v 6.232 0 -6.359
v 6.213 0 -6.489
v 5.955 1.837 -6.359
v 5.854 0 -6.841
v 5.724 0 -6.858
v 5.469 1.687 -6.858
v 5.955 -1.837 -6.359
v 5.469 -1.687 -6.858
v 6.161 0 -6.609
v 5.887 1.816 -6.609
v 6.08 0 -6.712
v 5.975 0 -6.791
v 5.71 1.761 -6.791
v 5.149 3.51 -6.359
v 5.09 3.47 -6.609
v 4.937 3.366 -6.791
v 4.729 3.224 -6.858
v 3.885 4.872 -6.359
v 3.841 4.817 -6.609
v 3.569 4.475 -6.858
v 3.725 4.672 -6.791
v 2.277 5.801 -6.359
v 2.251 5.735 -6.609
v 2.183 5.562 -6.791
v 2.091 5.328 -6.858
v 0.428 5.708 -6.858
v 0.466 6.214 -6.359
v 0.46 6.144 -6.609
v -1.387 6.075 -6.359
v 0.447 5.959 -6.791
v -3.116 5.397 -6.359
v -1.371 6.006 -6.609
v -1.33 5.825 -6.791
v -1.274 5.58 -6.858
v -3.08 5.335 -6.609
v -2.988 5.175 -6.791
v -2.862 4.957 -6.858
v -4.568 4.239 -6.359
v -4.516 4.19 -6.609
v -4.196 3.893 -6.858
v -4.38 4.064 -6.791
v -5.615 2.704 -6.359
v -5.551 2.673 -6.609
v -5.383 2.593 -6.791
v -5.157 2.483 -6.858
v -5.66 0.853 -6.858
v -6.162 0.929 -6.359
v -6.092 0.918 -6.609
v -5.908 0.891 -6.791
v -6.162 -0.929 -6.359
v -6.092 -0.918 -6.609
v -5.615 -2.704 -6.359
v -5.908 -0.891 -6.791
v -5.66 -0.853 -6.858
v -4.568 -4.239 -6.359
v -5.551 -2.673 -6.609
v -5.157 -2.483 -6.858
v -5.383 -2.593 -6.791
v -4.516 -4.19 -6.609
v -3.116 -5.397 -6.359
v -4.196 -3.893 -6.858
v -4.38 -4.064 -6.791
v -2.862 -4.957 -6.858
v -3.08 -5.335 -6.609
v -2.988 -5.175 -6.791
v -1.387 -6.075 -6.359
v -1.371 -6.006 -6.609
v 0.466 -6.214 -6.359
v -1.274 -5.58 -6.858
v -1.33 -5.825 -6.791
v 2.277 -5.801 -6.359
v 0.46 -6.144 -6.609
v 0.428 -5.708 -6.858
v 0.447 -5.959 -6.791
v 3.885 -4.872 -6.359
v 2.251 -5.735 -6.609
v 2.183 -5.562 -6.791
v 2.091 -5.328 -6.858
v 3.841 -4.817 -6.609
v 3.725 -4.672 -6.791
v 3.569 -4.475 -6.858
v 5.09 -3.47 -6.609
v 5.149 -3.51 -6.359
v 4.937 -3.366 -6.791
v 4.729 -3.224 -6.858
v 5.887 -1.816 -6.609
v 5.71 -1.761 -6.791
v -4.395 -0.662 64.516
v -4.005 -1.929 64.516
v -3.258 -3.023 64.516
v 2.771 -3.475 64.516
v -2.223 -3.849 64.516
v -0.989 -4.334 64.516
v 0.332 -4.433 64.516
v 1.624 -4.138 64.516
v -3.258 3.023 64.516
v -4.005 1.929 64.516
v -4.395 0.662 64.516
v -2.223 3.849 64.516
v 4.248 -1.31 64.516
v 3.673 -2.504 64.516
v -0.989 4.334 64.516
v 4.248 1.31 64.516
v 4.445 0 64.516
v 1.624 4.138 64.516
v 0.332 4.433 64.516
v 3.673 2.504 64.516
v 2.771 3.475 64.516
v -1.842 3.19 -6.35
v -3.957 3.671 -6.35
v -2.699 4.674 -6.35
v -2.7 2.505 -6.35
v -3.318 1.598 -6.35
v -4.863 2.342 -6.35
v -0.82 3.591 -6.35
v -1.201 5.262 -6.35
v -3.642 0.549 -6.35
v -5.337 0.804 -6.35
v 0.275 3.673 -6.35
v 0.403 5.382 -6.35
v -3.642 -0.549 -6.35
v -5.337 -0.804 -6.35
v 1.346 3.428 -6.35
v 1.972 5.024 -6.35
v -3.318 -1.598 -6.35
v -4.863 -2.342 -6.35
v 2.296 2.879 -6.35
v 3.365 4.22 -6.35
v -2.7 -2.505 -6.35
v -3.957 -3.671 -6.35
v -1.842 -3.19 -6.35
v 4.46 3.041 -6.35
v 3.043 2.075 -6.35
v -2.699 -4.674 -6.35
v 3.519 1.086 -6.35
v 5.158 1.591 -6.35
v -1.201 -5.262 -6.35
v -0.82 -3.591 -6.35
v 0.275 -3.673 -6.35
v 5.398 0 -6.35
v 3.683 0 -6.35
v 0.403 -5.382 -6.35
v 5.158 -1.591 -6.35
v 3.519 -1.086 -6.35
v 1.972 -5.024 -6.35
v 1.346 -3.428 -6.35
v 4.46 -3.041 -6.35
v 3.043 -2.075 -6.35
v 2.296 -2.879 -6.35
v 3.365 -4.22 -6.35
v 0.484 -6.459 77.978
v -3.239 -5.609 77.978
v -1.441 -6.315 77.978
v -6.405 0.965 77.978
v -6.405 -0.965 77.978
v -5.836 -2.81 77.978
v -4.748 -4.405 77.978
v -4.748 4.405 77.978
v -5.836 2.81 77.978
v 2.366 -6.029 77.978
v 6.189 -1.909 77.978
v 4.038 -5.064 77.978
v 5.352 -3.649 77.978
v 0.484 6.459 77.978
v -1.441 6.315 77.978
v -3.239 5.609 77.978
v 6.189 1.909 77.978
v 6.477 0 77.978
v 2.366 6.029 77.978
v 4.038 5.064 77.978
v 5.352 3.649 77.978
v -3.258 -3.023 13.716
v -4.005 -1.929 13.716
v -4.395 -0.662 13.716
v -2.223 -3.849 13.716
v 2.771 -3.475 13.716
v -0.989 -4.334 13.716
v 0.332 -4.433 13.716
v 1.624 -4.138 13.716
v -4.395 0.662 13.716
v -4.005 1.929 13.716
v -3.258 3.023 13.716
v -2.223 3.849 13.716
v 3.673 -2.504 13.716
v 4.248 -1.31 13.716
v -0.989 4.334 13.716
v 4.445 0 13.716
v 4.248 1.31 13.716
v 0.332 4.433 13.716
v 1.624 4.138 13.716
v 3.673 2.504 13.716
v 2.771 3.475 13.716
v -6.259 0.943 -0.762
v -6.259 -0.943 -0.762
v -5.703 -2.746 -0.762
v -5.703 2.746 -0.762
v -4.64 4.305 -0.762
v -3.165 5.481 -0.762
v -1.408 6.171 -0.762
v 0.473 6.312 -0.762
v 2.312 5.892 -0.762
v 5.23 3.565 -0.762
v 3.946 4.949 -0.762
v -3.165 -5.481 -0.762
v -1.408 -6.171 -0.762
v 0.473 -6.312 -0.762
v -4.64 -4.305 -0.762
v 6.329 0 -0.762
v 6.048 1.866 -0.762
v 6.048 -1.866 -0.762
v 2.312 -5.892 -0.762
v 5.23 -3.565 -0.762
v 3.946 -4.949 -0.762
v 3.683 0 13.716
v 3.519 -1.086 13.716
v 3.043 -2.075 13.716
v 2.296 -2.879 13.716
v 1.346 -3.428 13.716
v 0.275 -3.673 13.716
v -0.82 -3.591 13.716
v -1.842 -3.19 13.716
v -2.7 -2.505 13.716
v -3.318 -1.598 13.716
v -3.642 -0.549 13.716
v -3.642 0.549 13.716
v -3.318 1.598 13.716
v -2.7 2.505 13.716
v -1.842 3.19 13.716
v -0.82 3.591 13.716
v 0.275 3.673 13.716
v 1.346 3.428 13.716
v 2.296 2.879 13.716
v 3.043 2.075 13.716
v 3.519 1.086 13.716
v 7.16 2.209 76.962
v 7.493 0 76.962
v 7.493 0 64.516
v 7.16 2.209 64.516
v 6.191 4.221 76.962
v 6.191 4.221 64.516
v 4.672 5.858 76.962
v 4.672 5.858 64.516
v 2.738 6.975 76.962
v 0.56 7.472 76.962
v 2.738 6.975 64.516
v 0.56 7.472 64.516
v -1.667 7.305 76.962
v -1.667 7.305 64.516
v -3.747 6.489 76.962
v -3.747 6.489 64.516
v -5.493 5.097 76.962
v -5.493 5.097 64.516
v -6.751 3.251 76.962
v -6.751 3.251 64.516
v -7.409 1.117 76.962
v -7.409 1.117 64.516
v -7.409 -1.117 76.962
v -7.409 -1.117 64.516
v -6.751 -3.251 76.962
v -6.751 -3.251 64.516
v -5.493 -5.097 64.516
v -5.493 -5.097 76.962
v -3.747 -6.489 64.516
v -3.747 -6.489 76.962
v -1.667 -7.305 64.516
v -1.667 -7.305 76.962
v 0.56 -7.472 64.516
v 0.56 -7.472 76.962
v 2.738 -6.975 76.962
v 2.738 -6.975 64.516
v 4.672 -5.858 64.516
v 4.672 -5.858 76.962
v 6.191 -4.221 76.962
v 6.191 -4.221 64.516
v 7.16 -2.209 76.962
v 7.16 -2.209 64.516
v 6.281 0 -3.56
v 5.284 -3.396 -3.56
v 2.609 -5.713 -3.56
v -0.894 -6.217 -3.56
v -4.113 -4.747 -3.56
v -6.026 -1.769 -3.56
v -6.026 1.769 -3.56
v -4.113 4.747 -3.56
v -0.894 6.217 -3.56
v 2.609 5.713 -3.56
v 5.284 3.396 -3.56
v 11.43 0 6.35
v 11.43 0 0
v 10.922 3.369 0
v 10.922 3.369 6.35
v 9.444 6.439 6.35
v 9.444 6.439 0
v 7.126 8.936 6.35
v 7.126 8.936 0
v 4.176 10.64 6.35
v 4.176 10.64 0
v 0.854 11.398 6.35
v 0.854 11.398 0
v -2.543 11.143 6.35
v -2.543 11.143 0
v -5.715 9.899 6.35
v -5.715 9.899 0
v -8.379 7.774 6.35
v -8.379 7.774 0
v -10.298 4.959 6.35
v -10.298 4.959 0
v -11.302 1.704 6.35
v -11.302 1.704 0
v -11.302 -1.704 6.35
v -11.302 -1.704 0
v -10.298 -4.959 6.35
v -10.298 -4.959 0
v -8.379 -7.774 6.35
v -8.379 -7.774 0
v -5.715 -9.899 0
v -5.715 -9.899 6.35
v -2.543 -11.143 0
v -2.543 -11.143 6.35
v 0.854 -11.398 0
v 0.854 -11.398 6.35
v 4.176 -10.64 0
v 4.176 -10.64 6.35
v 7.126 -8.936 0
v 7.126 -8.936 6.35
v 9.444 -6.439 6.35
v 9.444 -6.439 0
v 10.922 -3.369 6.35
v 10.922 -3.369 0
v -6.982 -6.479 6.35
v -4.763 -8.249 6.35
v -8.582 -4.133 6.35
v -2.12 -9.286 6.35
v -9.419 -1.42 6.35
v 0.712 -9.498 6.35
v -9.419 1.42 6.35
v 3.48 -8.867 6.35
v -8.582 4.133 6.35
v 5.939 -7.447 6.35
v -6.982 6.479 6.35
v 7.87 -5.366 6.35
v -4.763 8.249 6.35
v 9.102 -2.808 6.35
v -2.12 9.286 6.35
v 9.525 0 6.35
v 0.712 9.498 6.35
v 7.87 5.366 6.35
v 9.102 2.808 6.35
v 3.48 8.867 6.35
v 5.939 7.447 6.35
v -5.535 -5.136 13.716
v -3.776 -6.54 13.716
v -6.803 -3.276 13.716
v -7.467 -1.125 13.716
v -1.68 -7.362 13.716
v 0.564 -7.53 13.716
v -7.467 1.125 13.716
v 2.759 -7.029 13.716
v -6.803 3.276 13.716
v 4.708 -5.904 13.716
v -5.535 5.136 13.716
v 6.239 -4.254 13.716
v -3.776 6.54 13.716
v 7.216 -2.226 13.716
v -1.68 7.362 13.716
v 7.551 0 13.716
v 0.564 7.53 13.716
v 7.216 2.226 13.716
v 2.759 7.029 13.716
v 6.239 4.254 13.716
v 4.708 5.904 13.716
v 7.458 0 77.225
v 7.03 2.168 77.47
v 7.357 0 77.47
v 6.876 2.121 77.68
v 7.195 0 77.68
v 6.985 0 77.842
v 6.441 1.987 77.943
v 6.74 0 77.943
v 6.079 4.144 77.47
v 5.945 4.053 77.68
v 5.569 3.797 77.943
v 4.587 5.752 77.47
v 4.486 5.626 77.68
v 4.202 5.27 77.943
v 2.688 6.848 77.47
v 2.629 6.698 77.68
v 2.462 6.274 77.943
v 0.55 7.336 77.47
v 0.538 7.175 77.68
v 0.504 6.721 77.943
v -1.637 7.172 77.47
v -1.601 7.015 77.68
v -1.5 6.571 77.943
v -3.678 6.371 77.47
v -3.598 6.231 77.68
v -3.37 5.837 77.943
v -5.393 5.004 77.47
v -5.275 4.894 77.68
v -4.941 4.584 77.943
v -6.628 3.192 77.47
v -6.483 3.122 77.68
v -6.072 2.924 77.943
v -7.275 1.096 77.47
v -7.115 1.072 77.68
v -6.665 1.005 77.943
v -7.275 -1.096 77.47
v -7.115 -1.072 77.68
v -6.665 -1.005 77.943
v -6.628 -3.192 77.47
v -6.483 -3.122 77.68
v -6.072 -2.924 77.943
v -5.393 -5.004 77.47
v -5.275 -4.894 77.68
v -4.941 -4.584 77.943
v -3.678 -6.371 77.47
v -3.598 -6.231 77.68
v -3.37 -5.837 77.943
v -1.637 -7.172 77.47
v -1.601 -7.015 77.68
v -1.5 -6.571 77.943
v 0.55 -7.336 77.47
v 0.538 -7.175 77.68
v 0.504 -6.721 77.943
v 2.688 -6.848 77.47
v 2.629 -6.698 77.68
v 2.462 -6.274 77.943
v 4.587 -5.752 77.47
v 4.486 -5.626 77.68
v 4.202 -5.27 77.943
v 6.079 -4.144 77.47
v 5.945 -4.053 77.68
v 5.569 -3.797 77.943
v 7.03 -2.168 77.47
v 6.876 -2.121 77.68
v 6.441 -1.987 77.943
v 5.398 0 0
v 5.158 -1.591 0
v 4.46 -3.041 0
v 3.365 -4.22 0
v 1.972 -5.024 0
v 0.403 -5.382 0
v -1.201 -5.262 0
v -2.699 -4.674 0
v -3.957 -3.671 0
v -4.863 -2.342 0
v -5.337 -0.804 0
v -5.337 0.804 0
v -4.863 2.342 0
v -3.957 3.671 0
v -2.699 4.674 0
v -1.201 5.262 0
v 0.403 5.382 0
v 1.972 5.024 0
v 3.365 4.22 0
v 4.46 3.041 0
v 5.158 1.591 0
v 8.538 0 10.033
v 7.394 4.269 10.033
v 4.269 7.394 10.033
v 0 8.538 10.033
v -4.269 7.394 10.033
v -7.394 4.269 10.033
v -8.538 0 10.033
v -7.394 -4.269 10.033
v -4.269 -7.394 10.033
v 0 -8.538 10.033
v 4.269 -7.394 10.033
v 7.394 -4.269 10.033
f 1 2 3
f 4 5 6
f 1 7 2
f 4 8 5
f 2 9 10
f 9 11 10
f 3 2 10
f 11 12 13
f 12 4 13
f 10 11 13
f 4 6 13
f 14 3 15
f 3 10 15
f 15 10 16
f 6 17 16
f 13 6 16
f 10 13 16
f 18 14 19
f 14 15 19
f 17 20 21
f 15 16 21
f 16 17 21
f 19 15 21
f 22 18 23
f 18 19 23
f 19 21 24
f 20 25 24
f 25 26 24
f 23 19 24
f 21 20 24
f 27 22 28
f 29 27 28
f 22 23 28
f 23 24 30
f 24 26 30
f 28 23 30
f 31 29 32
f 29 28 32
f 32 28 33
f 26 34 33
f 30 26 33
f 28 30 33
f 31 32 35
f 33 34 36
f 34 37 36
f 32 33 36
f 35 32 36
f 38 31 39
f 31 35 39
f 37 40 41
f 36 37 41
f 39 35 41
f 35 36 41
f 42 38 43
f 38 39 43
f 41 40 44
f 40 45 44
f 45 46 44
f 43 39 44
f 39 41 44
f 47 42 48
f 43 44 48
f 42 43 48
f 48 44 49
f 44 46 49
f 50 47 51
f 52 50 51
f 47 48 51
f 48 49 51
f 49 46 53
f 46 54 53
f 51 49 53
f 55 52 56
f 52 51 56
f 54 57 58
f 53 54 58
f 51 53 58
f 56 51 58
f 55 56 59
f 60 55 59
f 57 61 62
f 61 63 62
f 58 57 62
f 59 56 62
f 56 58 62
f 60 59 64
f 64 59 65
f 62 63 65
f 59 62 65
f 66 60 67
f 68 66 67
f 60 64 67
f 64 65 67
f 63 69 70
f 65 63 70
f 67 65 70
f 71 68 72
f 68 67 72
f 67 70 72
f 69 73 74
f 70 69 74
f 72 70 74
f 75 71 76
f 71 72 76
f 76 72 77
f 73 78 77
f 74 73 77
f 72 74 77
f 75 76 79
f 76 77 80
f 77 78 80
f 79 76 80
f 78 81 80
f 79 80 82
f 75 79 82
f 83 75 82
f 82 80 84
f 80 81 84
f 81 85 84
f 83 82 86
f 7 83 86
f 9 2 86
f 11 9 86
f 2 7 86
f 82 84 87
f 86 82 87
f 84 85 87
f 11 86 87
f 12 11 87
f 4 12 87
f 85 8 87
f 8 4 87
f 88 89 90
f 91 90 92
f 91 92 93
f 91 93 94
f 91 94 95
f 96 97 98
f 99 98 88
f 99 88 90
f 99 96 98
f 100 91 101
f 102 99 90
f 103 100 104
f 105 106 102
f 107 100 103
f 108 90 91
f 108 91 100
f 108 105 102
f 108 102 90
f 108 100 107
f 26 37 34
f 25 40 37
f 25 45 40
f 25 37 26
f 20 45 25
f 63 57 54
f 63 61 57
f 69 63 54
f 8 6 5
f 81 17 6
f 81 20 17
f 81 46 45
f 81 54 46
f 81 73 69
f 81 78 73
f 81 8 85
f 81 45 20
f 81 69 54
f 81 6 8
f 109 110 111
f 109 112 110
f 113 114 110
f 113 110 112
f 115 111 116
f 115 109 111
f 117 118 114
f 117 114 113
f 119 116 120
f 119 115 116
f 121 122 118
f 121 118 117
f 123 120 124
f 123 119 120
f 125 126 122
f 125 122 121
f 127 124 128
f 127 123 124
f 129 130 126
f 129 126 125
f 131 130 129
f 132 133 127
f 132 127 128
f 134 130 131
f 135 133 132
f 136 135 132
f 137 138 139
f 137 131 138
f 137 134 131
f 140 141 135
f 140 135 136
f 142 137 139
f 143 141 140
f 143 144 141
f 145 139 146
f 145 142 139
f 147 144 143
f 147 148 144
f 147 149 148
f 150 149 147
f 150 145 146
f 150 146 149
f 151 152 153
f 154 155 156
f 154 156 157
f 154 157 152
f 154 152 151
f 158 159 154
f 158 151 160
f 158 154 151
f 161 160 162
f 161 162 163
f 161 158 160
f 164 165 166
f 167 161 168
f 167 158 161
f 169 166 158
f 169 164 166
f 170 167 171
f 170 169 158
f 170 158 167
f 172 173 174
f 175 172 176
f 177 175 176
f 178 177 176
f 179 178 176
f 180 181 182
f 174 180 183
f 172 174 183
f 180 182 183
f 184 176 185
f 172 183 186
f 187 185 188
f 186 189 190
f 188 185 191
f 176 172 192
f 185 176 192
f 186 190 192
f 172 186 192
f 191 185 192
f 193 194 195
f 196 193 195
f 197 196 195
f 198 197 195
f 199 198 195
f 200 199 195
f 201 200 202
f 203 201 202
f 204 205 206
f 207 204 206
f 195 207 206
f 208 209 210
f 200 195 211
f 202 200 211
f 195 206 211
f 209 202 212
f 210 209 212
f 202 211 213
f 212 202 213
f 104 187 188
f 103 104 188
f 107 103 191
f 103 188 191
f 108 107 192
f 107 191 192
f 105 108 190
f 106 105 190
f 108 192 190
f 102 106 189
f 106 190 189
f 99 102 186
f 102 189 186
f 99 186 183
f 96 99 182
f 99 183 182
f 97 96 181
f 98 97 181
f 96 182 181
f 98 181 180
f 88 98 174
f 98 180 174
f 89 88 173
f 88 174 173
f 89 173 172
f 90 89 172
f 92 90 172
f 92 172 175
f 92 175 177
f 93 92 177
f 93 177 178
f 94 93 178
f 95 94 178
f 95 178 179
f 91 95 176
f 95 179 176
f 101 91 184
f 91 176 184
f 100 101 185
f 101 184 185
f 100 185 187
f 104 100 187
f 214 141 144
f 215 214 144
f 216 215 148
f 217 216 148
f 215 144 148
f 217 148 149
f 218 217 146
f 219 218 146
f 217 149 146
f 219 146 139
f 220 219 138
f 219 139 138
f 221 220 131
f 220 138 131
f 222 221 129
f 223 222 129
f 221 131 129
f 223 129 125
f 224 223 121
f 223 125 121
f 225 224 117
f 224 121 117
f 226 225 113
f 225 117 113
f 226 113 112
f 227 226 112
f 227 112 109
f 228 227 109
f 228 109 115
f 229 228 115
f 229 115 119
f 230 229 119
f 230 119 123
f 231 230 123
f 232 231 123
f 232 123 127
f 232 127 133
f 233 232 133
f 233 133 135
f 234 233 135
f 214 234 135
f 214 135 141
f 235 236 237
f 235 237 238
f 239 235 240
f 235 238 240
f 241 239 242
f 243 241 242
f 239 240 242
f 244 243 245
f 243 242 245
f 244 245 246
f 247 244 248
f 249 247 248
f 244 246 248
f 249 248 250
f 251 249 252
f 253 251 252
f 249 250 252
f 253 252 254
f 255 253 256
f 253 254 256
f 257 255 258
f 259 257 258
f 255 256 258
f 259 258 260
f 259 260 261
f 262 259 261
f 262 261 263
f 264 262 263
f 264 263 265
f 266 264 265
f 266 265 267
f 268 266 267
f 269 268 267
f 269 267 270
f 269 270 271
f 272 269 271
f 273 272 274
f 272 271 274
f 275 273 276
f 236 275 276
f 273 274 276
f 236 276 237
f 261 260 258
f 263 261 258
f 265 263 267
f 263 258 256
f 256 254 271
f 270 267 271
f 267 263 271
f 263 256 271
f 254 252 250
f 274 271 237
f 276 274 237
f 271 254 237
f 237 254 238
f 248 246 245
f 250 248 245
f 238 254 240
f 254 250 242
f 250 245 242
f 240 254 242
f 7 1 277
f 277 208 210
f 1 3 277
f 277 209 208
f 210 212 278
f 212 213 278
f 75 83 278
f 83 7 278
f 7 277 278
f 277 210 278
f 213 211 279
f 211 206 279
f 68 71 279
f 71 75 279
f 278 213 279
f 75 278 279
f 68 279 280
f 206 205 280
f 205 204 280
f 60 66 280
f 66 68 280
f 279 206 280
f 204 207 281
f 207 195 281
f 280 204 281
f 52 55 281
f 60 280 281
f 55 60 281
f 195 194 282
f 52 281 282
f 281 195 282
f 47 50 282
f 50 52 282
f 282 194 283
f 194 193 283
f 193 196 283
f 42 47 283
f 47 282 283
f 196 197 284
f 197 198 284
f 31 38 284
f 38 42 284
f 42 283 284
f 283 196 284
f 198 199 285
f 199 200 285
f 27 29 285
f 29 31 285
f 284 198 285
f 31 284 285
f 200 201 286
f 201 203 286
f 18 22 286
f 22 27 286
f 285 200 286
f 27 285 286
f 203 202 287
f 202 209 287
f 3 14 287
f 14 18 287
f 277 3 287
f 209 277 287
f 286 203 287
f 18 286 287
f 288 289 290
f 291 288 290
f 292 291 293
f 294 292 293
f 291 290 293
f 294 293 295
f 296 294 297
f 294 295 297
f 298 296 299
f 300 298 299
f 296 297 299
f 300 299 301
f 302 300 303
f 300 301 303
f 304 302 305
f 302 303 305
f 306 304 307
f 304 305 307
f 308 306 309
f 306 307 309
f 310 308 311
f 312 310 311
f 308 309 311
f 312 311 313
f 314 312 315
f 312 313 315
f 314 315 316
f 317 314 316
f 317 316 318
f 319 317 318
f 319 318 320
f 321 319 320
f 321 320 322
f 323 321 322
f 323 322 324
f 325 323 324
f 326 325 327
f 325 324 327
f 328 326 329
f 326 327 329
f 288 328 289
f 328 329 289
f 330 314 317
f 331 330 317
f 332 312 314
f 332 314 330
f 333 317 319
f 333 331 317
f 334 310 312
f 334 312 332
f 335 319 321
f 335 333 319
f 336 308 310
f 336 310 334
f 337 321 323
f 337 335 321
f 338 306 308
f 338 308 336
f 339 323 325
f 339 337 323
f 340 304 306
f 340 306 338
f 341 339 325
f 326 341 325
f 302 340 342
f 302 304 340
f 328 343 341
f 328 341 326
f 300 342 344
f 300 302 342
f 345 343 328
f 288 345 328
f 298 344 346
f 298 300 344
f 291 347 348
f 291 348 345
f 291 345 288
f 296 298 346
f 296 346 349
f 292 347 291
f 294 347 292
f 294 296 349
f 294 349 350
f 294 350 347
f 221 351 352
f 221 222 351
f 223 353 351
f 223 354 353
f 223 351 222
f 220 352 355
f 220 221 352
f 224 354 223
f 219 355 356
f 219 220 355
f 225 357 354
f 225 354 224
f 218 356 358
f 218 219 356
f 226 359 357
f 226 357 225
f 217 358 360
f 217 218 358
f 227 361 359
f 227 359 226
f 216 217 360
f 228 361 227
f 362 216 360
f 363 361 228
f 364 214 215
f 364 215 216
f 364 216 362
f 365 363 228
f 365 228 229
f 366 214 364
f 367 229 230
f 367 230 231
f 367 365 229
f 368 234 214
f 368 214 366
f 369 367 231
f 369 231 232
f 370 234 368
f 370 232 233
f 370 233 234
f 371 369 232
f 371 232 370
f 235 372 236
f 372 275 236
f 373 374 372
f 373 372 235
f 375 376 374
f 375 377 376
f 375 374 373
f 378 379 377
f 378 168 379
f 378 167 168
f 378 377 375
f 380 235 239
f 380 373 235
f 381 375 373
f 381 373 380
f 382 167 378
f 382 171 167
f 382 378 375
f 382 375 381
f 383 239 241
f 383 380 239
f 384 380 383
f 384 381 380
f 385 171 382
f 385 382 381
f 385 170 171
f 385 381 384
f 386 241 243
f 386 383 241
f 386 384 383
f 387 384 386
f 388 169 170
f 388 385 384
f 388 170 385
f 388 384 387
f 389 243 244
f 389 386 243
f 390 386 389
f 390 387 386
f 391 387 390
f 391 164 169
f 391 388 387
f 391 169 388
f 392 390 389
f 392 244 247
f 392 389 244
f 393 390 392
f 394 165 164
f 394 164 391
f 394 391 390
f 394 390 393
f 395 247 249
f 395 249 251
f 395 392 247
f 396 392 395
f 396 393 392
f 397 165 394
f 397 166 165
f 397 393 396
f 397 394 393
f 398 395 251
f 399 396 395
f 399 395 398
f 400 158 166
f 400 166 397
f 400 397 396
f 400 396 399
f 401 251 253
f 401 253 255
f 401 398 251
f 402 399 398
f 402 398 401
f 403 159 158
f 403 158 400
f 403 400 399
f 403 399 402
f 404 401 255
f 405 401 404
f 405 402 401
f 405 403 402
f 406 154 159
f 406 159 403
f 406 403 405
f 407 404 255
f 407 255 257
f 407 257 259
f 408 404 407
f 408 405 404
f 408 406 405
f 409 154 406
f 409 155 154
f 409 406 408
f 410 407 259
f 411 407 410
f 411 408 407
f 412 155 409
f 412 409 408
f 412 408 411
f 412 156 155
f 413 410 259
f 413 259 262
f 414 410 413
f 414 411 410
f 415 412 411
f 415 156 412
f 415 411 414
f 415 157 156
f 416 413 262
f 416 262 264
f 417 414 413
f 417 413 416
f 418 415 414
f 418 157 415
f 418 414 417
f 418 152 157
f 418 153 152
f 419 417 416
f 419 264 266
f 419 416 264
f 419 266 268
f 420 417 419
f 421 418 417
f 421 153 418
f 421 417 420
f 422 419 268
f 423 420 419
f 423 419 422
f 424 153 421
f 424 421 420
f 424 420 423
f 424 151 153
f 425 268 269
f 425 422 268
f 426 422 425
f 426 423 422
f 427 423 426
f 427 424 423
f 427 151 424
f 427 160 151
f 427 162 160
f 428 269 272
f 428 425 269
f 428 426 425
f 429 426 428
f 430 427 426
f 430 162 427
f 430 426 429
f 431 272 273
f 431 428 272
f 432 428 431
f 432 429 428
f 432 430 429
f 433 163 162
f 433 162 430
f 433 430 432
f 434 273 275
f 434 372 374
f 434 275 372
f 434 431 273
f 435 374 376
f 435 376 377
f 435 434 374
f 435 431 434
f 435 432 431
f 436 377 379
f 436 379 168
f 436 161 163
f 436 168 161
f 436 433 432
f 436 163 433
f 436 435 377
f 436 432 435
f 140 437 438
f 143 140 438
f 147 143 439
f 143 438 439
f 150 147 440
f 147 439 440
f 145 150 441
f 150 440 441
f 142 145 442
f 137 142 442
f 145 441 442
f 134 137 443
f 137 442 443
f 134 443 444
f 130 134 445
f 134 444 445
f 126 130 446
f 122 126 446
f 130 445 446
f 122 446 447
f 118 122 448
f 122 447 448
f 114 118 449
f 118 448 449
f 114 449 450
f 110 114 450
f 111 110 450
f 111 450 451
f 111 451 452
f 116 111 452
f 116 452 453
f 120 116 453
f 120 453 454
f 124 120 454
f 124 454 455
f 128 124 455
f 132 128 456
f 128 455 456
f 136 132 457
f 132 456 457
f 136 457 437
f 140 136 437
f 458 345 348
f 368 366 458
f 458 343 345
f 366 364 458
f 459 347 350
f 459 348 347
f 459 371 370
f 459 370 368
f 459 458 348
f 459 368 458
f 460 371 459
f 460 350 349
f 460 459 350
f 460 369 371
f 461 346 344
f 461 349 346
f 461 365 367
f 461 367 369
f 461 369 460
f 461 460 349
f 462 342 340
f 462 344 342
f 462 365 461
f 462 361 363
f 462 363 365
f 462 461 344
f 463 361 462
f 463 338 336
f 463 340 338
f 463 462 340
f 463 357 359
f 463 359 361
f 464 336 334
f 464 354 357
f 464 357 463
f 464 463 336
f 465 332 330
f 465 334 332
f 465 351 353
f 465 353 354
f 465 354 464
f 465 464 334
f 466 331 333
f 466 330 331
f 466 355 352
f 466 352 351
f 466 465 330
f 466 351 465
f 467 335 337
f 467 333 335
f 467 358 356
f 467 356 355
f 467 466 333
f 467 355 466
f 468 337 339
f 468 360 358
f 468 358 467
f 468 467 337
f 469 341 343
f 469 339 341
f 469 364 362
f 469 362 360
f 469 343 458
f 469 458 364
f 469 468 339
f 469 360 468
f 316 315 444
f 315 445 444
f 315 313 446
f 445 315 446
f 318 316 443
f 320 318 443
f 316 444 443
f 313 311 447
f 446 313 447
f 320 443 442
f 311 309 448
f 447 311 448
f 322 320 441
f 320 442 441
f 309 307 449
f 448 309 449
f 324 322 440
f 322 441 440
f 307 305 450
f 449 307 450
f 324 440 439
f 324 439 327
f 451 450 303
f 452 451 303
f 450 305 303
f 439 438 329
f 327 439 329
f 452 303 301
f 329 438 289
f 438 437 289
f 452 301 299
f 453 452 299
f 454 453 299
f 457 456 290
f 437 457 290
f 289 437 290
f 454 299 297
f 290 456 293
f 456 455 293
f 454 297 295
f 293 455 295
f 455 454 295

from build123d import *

# Parameters (mm, degrees)
F0_R      = 11.43
F1_DEPTH  = 6.35
F2_R      = 9.525
F3_DEPTH  = 7.366
F3_TAPER  = 15
F4_R      = 5.3975
F5_DEPTH  = 6.35
F6_R      = 3.683
F7_DEPTH  = 20.067
F8_R      = 4.445
F9_DEPTH  = 50.8
F10_R     = 7.493
F11_DEPTH = 13.462
F12_R     = 1.016
F14_R     = 6.223
F15_DEPTH = 6.096
F15_TAPER = -1
F16_R     = 0.508


with BuildPart() as f1:
    # F0 (on Top) → F1 (new body)
    with BuildSketch(Plane.XY):
        Circle(F0_R)
    extrude(amount=F1_DEPTH)

    # F2 (on face) → F3 (join)
    with BuildSketch(Plane.XY.offset(6.35)):
        Circle(F2_R)
    extrude(amount=F3_DEPTH, taper=F3_TAPER)

    # F4 (on face) → F5 (join)
    with BuildSketch(Plane(origin=(0, 0, 0), x_dir=(1, 0, 0), z_dir=(0, 0, -1))):
        Circle(F4_R)
    extrude(amount=F5_DEPTH)

    # F6 (on face) → F7 (cut, through all)
    with BuildSketch(Plane(origin=(0, 0, -6.35), x_dir=(1, 0, 0), z_dir=(0, 0, -1))):
        Circle(F6_R)
    extrude(amount=-F7_DEPTH, mode=Mode.SUBTRACT)


with BuildPart() as f9:
    # F8 (on face) → F9 (new body)
    with BuildSketch(Plane.XY.offset(13.716)):
        Circle(F8_R)
    extrude(amount=F9_DEPTH)


with BuildPart() as f11:
    # F10 (on face) → F11 (new body)
    with BuildSketch(Plane.XY.offset(64.516)):
        Circle(F10_R)
    extrude(amount=F11_DEPTH)

    # F12
    f12_edges = [f11.edges().sort_by_distance(p)[0] for p in [
        (-7.493, 0, 77.978),
    ]]
    fillet(f12_edges, radius=F12_R)


with BuildPart() as f15:
    # F14 (on offset) → F15 (new body)
    with BuildSketch(Plane(origin=(0, 0, -6.858), x_dir=(1, 0, 0), z_dir=(0, 0, -1))):
        Circle(F14_R)
    extrude(amount=-F15_DEPTH, taper=F15_TAPER)

    # F16
    f16_edges = [f15.edges().sort_by_distance(p)[0] for p in [
        (-6.223, 0, -6.858),
    ]]
    fillet(f16_edges, radius=F16_R)


solid = Compound([f1.part, f9.part, f11.part, f15.part])
